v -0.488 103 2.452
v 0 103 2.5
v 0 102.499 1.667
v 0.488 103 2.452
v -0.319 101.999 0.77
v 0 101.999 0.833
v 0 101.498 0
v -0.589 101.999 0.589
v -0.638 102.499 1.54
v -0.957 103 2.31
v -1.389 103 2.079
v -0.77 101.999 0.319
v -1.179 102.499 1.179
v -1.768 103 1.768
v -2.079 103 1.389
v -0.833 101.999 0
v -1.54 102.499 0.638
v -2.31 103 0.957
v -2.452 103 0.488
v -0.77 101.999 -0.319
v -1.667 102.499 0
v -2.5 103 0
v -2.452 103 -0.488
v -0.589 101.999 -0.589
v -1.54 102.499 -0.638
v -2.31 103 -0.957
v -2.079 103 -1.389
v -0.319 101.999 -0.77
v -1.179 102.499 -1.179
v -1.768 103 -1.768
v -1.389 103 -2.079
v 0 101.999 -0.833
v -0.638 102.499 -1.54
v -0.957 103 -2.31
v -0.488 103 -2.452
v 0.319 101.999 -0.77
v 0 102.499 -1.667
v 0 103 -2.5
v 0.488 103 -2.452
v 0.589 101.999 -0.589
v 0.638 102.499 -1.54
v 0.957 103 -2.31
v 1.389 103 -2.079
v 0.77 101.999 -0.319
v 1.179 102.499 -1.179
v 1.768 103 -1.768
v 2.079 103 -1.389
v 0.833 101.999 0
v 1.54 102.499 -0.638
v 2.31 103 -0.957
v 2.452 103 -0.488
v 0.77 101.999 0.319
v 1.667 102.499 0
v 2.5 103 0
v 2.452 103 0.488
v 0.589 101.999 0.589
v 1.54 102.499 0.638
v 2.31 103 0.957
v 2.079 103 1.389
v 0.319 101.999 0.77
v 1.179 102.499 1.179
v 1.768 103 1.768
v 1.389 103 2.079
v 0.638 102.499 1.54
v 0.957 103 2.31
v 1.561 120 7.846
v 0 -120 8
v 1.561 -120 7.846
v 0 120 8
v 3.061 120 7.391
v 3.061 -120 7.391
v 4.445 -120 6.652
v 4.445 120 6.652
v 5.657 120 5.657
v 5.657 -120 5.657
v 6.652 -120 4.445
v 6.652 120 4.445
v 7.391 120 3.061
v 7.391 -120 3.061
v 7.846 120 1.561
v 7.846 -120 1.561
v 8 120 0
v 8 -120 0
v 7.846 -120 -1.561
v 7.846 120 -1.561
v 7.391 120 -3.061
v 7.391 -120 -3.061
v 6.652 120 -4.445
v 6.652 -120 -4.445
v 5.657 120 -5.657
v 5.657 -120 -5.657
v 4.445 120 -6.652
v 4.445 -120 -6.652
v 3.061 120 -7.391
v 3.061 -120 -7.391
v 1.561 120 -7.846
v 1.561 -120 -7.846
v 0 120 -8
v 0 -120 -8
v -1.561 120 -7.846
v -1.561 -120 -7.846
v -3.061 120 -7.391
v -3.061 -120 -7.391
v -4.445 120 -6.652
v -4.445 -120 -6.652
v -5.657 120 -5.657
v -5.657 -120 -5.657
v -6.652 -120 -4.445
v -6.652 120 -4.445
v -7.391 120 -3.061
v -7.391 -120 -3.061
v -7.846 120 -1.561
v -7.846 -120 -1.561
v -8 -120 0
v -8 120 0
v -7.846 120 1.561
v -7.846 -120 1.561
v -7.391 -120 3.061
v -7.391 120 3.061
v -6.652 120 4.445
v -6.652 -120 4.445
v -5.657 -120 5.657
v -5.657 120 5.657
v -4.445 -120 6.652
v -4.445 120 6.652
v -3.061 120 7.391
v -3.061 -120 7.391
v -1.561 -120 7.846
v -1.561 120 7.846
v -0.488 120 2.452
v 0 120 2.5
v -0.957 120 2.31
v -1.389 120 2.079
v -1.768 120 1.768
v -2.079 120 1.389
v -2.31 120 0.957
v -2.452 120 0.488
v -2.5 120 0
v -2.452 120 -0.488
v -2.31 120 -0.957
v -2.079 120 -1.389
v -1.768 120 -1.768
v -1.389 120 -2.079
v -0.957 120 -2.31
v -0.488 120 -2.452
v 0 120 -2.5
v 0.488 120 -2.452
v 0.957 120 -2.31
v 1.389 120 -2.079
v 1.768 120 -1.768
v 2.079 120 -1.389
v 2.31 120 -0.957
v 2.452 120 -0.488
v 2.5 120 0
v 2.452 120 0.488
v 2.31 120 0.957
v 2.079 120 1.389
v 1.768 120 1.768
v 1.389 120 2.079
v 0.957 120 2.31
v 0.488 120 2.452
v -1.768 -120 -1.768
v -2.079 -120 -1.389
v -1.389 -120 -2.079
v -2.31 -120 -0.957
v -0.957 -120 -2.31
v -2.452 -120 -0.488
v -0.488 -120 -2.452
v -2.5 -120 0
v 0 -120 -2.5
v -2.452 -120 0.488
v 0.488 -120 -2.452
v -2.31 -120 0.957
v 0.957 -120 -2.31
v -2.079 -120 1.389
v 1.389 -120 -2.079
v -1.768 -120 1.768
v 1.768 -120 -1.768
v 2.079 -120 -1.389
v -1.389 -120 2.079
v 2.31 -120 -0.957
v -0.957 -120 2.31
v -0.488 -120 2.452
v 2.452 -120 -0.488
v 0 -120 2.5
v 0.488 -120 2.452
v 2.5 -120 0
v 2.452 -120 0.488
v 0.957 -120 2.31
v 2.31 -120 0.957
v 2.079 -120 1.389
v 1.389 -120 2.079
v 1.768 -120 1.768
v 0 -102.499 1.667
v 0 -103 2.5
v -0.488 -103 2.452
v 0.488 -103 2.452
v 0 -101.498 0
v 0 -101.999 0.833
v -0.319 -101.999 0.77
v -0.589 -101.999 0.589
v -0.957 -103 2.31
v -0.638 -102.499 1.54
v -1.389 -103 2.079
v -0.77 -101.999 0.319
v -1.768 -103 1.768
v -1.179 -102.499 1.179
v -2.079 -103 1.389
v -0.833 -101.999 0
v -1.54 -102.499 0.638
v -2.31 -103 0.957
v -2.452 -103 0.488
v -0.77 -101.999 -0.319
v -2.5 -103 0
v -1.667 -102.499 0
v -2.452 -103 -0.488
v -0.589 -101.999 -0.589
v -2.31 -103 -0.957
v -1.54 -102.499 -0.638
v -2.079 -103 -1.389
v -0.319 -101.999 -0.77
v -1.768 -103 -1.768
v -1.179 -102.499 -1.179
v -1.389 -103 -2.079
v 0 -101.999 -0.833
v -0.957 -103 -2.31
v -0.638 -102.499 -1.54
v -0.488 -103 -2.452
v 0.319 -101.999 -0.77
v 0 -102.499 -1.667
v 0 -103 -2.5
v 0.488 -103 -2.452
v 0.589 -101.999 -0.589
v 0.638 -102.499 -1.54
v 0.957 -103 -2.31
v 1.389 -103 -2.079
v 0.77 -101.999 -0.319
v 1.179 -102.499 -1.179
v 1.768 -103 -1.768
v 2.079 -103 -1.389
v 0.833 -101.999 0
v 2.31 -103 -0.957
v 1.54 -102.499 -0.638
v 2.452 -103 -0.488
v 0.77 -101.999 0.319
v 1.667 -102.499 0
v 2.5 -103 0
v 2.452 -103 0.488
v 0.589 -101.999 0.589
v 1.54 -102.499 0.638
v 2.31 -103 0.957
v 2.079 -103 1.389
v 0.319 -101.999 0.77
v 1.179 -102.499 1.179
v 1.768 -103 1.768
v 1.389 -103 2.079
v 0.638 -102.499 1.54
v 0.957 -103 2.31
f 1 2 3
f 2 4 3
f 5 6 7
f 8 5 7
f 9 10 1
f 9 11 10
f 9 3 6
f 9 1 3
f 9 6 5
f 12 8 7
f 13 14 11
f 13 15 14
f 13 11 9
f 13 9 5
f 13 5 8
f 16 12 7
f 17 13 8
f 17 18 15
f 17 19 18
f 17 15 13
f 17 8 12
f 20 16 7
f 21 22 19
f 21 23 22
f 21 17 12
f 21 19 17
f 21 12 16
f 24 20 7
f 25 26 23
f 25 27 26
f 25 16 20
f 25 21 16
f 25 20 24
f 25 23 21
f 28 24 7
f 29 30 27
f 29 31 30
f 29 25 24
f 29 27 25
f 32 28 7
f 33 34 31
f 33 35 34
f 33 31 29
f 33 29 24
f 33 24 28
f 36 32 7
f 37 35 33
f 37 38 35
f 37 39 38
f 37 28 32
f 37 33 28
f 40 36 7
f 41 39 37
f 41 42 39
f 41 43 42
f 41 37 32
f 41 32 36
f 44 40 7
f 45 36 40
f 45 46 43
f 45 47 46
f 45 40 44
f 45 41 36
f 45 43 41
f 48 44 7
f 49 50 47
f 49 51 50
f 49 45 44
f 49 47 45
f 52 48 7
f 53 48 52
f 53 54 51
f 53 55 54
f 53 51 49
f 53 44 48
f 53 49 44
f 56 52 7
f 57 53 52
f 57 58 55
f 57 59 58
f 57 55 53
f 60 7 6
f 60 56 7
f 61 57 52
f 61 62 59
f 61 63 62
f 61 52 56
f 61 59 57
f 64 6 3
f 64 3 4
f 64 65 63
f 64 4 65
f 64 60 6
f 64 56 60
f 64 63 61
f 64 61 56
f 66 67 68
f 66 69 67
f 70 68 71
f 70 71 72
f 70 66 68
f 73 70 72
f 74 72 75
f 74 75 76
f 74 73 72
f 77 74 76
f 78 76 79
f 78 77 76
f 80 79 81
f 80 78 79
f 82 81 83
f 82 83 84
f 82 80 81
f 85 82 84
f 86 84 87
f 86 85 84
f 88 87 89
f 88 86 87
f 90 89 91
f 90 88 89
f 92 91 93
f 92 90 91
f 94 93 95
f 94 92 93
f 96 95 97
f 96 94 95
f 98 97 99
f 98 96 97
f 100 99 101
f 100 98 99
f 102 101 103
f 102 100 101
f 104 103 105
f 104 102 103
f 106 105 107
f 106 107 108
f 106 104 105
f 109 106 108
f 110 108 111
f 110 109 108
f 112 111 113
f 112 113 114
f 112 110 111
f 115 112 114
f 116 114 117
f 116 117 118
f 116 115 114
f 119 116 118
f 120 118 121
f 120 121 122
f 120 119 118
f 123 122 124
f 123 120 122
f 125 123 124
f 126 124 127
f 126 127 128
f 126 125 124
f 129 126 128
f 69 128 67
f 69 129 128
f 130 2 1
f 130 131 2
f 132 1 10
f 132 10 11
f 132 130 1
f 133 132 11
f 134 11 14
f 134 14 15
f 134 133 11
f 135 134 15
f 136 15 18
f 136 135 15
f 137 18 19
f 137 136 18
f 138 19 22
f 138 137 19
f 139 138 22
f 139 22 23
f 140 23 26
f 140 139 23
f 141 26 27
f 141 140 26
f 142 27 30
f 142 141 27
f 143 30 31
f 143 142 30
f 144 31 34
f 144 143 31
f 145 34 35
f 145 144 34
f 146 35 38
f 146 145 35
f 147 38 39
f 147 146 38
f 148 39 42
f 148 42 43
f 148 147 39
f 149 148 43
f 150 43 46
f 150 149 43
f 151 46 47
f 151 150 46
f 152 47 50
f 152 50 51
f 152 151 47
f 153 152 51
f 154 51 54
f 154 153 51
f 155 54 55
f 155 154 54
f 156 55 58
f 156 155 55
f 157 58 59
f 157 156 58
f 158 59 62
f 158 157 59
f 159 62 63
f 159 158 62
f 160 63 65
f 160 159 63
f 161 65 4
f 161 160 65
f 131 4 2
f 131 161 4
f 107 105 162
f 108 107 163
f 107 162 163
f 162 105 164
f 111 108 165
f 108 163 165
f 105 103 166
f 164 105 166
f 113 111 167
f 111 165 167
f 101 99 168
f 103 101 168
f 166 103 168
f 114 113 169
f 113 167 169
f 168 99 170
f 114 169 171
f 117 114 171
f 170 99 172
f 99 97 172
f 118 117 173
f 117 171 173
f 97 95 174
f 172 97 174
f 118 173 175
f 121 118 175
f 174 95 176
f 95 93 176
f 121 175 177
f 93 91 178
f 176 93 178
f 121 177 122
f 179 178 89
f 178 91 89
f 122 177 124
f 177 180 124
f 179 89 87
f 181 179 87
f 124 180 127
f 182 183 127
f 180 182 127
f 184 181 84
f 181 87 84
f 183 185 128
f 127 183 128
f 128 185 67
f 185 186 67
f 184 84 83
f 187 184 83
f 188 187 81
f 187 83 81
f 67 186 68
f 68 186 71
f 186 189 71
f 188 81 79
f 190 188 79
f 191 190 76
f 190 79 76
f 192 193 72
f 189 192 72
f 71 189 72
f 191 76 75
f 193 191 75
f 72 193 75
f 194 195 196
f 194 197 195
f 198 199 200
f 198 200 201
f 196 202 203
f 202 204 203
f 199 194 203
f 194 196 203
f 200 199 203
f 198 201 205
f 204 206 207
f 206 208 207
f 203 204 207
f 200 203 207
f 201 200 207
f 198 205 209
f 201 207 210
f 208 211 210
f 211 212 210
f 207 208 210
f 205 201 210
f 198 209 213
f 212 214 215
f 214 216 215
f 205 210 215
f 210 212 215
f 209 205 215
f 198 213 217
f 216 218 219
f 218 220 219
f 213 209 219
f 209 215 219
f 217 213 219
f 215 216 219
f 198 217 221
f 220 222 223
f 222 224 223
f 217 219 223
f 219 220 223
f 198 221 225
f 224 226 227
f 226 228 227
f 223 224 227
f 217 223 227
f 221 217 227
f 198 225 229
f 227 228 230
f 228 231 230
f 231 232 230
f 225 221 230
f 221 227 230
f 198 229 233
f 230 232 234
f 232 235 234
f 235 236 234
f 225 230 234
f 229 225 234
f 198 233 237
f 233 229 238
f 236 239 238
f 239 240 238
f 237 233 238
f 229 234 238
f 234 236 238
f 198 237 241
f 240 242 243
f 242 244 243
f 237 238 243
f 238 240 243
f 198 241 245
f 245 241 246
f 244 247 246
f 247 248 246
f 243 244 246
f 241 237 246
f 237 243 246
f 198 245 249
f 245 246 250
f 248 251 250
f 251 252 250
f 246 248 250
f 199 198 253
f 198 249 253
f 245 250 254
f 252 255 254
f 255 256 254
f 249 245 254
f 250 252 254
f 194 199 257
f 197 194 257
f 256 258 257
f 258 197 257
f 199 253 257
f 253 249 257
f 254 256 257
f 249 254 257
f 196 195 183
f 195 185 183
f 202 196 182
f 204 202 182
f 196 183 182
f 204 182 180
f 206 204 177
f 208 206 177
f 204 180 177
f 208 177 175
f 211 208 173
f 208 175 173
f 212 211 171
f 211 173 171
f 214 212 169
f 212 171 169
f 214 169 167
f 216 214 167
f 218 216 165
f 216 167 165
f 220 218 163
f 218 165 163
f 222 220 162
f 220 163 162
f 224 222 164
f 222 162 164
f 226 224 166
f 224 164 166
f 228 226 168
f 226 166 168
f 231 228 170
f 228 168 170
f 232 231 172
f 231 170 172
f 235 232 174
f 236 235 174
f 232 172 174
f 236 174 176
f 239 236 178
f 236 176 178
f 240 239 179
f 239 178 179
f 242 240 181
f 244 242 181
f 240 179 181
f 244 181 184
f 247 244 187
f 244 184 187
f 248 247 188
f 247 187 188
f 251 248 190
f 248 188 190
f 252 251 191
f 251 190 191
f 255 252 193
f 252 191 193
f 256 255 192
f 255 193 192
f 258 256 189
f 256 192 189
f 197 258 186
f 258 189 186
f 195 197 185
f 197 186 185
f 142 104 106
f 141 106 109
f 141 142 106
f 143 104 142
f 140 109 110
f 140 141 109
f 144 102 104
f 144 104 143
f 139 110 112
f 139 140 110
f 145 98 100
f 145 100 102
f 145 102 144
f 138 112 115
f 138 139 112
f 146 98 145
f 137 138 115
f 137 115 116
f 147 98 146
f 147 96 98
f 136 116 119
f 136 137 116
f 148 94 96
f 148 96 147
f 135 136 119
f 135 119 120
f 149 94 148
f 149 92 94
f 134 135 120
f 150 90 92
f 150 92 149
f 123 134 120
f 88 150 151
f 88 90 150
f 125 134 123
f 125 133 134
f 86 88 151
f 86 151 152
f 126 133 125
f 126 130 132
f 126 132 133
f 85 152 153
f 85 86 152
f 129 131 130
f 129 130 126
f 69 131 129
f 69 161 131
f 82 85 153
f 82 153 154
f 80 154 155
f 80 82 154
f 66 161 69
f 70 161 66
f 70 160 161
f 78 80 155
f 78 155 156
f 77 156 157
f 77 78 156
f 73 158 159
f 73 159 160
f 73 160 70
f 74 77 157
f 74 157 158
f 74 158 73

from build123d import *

# Parameters (mm, degrees)
SKETCH_1_R      = 8
EXTRUDE_1_DEPTH = 120


with BuildPart() as part:
    # 草图1 → 凸台-拉伸1 (new, symmetric)
    with BuildSketch(Plane(origin=(0, 0, 0), x_dir=(1, 0, 0), z_dir=(0, 1, 0))):
        with Locations(Location((0, 0, 0), (0, 0, 270))):
            Circle(SKETCH_1_R)
    extrude(amount=EXTRUDE_1_DEPTH, both=True)

    # 草图3 → M6 螺纹孔1 (revolve, cut)
    with BuildSketch(Plane(origin=(0, 120, 0), x_dir=(0, 0, 1), z_dir=(1, 0, 0))):
        Polygon((0, 0), (0, 18.502151548), (2.5, 17), (2.5, 0), align=None)
    hole_wizard_m6_1 = revolve(axis=Axis((0, 126.35, 0), (0, -1, 0)), mode=Mode.SUBTRACT)

    # 镜向1: M6 螺纹孔1 across plane
    add(hole_wizard_m6_1.mirror(Plane.ZX), mode=Mode.SUBTRACT)


solid = part.part
